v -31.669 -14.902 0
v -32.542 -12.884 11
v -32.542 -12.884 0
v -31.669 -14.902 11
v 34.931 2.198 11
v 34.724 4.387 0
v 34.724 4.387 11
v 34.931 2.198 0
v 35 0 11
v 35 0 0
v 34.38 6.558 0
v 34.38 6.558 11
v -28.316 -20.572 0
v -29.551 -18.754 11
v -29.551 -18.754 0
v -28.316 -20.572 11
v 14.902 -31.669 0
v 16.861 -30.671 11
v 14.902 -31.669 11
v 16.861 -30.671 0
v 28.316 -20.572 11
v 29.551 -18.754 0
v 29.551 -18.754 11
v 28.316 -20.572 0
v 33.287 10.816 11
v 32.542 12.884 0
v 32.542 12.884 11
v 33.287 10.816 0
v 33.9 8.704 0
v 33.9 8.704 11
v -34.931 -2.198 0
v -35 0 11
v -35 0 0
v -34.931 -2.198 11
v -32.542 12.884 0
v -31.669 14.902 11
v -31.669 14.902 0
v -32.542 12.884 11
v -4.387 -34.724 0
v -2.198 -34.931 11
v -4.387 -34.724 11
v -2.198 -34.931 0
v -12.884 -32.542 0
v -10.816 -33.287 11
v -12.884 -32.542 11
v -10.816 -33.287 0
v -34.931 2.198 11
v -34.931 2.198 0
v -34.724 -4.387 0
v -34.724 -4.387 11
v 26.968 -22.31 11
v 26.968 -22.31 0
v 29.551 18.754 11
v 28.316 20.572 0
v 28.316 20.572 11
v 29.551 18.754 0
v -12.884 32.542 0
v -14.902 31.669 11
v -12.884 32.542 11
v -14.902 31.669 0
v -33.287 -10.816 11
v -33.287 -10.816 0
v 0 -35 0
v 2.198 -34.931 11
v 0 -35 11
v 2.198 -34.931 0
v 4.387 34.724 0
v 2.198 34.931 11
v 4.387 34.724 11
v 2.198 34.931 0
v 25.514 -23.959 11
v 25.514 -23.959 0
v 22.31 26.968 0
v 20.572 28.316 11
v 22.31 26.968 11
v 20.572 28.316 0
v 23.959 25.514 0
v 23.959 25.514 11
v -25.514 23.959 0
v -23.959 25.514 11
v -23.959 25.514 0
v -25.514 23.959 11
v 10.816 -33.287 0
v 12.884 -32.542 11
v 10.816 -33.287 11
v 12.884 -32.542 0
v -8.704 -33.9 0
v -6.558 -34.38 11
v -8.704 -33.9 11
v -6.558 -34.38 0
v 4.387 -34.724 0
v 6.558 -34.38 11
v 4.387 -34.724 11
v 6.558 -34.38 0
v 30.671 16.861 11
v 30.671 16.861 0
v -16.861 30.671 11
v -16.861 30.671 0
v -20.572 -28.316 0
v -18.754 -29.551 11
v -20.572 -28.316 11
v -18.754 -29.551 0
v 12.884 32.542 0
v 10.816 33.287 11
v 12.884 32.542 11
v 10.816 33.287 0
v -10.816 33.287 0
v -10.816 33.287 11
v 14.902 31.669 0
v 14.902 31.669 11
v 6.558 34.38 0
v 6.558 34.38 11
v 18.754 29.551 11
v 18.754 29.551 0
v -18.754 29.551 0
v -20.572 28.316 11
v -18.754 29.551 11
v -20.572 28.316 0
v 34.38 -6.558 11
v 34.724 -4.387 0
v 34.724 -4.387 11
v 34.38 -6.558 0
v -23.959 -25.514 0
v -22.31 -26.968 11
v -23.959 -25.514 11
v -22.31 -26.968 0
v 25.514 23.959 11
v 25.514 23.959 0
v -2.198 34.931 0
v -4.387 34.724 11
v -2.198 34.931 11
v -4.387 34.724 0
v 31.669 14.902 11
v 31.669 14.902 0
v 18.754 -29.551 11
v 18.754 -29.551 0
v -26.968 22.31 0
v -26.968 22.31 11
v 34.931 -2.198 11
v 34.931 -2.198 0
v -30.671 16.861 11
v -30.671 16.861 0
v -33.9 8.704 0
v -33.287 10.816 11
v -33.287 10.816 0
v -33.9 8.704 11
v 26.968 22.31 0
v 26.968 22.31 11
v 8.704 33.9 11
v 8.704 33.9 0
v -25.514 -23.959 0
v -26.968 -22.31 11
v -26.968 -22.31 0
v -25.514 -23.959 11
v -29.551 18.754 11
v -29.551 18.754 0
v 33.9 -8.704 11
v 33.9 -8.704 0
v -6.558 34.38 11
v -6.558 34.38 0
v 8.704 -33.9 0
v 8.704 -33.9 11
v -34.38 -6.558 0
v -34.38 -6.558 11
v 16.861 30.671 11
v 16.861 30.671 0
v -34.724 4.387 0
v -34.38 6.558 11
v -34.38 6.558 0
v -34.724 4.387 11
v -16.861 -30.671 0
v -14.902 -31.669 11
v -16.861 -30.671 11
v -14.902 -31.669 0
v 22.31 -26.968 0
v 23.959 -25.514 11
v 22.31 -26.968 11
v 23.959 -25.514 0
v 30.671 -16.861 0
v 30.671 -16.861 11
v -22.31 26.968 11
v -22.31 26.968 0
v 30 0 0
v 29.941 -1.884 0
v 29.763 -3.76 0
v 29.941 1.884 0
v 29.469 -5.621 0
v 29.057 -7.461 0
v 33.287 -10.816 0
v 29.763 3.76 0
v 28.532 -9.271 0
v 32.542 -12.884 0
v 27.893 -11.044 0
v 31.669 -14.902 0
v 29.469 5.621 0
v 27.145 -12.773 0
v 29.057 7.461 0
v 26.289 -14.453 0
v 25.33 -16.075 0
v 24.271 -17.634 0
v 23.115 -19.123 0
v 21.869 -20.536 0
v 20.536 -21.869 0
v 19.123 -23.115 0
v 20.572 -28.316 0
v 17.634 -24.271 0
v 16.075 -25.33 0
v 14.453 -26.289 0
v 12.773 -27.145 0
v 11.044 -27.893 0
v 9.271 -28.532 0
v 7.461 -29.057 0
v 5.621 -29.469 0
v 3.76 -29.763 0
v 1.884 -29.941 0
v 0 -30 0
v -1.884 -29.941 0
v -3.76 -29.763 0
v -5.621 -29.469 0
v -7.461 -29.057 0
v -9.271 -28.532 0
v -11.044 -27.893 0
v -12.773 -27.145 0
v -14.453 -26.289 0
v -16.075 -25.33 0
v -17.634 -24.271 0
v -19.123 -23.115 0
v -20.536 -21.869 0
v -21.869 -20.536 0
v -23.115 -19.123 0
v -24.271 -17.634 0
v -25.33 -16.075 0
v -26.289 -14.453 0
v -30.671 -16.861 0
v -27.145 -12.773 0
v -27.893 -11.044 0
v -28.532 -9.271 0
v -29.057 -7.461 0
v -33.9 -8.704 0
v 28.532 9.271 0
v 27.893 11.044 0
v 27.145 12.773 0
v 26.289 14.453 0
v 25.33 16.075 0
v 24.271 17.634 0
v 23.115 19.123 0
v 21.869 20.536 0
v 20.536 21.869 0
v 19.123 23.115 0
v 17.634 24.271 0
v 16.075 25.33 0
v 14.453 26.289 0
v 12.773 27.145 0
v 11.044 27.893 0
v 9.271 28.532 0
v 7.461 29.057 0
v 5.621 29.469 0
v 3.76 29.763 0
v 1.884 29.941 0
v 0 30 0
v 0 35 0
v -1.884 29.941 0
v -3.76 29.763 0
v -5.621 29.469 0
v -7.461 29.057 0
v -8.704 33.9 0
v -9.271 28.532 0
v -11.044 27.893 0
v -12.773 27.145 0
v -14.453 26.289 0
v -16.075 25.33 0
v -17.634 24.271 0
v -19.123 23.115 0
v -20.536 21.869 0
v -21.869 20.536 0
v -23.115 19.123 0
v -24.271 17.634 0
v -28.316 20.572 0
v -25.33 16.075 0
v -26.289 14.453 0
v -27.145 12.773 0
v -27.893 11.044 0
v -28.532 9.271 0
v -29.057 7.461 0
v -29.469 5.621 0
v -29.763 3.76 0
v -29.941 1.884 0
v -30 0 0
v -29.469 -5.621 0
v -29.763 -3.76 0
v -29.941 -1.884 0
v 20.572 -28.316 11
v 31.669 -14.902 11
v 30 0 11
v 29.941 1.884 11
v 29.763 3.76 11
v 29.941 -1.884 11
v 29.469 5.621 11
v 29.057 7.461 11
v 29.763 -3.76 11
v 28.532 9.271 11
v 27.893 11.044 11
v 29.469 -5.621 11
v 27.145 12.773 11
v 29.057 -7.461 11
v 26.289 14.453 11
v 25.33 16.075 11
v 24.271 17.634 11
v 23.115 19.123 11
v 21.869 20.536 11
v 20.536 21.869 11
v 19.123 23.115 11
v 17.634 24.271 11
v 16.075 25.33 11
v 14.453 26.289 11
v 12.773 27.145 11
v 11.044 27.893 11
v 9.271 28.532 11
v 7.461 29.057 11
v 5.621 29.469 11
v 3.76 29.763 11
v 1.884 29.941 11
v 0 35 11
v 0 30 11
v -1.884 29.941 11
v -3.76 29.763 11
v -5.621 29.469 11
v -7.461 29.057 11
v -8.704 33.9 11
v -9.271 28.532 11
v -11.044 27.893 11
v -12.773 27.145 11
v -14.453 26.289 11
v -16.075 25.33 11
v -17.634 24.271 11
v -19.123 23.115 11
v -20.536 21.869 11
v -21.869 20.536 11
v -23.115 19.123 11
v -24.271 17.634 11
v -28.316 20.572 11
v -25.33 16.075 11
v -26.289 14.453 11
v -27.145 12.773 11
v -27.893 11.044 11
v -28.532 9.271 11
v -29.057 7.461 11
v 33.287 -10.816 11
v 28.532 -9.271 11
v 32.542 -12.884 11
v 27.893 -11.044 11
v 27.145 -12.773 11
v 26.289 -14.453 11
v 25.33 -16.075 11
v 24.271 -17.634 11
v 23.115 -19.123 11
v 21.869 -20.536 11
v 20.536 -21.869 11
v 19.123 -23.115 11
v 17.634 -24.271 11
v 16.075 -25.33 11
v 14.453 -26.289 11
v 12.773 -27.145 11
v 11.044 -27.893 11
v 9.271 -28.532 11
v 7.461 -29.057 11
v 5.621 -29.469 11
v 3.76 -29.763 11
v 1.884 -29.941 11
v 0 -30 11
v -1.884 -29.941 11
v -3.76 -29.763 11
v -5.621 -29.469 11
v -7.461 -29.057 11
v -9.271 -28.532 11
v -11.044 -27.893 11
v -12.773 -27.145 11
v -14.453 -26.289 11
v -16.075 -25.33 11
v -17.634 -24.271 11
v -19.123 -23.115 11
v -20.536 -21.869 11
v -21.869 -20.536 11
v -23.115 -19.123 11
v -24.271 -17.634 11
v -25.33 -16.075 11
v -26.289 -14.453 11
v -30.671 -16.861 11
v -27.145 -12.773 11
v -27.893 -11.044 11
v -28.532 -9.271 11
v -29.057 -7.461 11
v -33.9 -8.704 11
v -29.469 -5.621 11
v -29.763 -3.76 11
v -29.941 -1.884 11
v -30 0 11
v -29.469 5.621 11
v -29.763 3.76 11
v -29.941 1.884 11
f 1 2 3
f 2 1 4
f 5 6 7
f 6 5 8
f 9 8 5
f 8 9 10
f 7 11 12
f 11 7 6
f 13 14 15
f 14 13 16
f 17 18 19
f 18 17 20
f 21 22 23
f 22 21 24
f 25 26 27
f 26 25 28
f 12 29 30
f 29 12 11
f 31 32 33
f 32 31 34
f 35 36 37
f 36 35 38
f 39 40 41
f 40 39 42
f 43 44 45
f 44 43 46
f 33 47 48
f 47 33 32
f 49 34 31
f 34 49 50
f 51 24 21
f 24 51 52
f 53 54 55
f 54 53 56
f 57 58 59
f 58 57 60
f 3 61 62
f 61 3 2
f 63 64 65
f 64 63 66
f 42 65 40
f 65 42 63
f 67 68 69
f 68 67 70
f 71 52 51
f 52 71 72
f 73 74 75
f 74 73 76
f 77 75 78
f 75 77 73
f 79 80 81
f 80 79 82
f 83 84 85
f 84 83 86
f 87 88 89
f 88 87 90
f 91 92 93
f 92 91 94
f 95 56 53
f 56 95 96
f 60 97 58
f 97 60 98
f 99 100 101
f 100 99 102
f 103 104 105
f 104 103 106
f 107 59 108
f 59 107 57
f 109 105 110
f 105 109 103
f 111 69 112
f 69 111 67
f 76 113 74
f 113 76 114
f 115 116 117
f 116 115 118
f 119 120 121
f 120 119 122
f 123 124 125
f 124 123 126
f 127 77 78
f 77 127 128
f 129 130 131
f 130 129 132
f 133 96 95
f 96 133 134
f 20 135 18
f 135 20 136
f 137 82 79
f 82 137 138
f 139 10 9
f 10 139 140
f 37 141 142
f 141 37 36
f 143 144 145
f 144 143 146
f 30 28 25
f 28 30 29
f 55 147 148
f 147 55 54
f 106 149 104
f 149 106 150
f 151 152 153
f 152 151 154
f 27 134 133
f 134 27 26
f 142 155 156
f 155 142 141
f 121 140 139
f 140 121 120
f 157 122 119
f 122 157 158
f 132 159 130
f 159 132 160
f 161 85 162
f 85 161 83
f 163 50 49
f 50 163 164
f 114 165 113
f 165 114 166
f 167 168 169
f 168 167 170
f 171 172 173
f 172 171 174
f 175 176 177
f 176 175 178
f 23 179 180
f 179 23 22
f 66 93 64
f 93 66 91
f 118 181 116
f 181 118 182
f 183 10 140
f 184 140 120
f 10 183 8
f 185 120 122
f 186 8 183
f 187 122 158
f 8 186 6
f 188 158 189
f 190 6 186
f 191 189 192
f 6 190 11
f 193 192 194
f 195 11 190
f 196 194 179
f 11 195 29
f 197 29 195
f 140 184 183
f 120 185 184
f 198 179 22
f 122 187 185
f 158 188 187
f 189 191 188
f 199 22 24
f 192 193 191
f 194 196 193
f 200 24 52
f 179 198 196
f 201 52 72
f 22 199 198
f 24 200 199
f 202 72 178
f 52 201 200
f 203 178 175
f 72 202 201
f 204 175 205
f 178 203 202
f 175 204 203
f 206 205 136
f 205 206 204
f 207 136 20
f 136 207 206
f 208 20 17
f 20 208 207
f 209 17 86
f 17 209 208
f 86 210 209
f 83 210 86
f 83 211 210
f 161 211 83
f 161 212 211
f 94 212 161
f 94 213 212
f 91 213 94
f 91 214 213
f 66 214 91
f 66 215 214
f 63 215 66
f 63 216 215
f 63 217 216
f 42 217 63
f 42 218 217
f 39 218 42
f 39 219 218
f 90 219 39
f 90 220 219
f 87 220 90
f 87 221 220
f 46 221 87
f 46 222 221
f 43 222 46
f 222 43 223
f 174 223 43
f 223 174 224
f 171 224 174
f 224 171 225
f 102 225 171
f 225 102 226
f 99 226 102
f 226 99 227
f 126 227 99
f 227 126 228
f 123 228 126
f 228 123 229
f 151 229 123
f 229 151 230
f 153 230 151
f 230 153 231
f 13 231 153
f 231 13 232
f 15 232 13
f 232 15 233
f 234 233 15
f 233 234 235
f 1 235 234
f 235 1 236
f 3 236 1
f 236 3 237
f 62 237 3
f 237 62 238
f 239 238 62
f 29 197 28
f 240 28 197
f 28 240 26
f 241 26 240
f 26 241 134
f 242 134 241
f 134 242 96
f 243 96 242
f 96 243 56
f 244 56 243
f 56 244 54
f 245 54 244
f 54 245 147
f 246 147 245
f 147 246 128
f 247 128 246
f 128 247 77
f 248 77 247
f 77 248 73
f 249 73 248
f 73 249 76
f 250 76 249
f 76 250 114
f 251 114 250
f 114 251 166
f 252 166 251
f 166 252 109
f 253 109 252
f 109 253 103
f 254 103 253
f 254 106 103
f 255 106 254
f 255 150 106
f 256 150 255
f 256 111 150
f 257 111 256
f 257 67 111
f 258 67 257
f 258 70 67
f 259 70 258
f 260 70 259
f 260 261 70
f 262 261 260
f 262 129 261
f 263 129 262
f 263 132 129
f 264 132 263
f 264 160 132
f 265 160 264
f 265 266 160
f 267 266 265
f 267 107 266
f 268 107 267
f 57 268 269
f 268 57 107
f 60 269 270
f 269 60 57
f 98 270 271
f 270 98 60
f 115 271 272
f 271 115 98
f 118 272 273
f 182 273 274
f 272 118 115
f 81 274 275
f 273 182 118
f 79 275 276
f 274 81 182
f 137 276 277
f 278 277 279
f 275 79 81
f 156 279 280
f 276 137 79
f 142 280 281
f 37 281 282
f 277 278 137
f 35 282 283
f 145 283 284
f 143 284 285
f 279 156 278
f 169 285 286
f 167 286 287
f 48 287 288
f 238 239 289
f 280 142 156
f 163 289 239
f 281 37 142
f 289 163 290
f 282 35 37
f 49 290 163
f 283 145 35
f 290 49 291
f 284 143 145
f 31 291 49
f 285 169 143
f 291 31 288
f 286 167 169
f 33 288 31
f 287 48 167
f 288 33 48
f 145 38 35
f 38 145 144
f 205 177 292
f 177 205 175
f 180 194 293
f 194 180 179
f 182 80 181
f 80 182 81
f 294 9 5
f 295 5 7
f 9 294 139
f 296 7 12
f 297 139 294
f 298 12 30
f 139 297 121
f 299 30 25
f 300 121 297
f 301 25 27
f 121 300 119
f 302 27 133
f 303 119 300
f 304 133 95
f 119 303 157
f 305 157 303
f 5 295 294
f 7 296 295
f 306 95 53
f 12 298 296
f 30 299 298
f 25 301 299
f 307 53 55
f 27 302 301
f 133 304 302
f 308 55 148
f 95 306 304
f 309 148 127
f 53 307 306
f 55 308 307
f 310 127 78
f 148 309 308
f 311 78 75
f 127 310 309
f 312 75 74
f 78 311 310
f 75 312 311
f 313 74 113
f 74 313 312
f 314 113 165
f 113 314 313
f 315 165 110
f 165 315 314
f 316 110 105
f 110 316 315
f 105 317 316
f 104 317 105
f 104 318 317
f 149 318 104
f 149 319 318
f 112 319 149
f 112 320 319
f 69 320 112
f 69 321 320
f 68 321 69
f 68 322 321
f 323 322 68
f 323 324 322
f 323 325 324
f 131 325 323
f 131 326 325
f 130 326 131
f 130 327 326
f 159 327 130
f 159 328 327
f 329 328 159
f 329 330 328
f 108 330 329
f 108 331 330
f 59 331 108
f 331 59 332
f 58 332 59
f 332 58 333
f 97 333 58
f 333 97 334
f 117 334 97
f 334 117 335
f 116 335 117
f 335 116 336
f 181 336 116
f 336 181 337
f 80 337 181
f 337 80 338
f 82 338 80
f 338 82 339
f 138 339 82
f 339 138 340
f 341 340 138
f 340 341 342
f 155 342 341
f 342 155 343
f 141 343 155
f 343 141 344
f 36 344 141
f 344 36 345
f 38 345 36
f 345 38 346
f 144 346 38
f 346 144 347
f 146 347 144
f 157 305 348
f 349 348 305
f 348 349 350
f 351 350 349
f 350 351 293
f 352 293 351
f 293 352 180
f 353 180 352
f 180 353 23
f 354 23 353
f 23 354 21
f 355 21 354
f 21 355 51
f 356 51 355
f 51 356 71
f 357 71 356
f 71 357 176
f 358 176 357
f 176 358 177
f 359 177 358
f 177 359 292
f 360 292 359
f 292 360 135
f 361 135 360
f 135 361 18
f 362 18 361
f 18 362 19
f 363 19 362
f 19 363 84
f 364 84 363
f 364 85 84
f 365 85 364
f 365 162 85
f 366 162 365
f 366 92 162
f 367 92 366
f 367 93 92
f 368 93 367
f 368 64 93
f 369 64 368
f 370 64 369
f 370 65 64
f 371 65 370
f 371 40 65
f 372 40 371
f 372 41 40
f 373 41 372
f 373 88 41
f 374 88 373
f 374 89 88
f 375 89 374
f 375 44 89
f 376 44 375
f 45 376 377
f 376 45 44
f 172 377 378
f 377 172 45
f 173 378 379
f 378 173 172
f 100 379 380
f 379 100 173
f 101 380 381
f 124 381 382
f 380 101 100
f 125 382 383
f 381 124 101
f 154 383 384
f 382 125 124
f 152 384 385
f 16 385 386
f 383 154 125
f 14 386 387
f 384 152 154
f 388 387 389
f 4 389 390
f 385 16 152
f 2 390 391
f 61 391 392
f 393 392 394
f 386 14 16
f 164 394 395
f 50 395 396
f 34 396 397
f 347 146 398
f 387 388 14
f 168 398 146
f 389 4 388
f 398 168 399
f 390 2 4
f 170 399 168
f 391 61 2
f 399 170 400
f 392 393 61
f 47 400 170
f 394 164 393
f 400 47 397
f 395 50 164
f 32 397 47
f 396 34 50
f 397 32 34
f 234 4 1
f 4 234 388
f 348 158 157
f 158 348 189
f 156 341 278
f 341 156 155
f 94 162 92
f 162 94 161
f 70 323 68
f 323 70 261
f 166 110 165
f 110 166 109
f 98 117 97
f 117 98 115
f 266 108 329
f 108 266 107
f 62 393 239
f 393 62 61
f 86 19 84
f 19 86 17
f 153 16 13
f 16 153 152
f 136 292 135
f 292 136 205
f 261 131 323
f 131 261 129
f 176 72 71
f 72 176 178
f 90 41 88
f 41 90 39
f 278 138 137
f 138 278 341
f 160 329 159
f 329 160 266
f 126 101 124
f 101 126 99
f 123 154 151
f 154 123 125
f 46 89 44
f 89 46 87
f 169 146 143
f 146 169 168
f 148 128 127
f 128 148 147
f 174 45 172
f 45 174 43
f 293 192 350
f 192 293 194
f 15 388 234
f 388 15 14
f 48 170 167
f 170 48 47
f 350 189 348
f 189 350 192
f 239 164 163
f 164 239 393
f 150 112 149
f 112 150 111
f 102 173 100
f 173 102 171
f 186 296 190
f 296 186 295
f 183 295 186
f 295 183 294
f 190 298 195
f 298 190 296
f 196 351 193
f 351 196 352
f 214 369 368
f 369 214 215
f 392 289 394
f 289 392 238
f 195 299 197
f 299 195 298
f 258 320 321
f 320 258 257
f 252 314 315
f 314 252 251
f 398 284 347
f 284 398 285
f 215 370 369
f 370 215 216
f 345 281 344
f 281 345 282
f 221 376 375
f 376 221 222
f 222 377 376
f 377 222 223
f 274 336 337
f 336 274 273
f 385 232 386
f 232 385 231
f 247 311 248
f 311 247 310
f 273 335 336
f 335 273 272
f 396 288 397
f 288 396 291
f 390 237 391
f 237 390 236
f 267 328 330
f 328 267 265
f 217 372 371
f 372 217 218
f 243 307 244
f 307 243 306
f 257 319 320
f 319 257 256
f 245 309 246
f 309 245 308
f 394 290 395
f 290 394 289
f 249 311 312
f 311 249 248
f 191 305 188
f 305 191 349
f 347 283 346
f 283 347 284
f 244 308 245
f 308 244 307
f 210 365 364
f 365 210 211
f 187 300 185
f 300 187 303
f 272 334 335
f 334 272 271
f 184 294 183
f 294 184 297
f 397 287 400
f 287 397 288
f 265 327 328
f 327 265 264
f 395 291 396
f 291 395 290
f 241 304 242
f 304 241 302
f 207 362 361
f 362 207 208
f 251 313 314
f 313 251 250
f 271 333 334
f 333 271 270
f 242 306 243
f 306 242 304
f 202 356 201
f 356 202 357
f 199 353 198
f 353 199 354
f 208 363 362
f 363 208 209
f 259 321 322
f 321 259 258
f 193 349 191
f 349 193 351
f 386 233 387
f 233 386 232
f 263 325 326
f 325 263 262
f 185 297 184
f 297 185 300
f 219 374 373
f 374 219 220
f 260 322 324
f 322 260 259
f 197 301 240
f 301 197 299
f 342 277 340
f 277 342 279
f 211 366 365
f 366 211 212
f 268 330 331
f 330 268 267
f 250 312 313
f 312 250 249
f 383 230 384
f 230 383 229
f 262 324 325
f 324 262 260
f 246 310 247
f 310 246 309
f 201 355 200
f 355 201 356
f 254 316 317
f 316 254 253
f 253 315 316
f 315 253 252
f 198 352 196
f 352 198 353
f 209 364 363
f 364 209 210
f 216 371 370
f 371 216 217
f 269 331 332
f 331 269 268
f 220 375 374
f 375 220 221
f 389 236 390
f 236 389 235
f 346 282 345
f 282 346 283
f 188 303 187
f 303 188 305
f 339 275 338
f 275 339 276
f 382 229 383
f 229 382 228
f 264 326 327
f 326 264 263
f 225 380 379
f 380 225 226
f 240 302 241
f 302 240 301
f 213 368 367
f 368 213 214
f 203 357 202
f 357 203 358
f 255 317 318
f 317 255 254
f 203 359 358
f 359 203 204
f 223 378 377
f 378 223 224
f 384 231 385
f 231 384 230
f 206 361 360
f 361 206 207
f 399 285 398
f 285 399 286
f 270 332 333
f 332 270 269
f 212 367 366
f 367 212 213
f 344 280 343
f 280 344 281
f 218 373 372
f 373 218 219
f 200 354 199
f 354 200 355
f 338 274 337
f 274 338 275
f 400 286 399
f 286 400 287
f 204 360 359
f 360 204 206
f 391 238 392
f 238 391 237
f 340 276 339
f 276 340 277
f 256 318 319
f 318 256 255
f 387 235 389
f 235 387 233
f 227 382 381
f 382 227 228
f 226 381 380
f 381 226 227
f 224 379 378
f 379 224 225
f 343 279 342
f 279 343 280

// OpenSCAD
use <WriteSVG.scad>

nombre="Gonzalo";
// Aro
module aro(grosor_aro=11,  diam_ext=70, diam_int = 60, texto = nombre)
{
 // Exterior Aro
 difference(){
    cylinder(r=diam_ext/2,h=grosor_aro,  $fn=100);
    //-- Taladro aro
   cylinder(r=diam_int/2, h=grosor_aro*3,$fn=100,center=true);
 }
	//Letras
	translate([0,0,0.75])writecylinder(texto,[0,0,0],diam_ext/2,grosor_aro);

}

aro();
